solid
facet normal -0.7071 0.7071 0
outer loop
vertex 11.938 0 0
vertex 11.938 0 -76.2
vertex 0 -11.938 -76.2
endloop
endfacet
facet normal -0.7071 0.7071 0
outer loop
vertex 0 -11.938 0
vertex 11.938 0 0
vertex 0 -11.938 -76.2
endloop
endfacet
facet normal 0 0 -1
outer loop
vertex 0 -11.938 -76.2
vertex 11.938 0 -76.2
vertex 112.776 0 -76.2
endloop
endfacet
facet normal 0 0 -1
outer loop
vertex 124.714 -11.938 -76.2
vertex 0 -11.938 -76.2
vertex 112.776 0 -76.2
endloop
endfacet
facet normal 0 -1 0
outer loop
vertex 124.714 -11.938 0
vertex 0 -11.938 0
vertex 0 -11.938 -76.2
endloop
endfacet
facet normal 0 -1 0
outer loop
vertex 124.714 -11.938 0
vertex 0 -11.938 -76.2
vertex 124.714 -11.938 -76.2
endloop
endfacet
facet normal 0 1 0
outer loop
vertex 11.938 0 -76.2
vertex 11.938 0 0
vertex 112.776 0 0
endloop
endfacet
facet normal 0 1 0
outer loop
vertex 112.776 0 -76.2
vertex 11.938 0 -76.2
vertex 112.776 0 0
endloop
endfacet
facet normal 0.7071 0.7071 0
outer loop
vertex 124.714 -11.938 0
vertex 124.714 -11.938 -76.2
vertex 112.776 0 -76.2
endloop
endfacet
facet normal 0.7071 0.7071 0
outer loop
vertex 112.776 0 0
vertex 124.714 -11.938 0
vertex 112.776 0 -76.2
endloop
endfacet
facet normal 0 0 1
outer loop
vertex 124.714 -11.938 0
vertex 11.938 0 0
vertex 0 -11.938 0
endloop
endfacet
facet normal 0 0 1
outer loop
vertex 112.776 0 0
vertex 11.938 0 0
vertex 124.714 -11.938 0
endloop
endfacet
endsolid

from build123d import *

# Parameters (mm, degrees)
F0_W     = 124.714
F0_H     = 76.2
F1_DEPTH = 11.938
F3_DEPTH = 76.201
F5_DEPTH = 76.201


with BuildPart() as f1:
    # F0 (on Front) → F1 (new body)
    with BuildSketch(Plane.XZ):
        with Locations((62.357, -38.1)):
            Rectangle(F0_W, F0_H)
    extrude(amount=F1_DEPTH)

    # F2 (on face) → F3 (cut, through all)
    with BuildSketch(Plane(origin=(0, 0, -76.2), x_dir=(1, 0, 0), z_dir=(0, 0, -1))):
        Polygon((11.938, 0), (0, 11.938), (0, 0), align=None)
    extrude(amount=-F3_DEPTH, mode=Mode.SUBTRACT)

    # F4 (on face) → F5 (cut, through all)
    with BuildSketch(Plane(origin=(0, 0, -76.2), x_dir=(1, 0, 0), z_dir=(0, 0, -1))):
        Polygon((124.714, 0), (124.714, 11.938), (112.776, 0), align=None)
    extrude(amount=-F5_DEPTH, mode=Mode.SUBTRACT)


solid = f1.part
